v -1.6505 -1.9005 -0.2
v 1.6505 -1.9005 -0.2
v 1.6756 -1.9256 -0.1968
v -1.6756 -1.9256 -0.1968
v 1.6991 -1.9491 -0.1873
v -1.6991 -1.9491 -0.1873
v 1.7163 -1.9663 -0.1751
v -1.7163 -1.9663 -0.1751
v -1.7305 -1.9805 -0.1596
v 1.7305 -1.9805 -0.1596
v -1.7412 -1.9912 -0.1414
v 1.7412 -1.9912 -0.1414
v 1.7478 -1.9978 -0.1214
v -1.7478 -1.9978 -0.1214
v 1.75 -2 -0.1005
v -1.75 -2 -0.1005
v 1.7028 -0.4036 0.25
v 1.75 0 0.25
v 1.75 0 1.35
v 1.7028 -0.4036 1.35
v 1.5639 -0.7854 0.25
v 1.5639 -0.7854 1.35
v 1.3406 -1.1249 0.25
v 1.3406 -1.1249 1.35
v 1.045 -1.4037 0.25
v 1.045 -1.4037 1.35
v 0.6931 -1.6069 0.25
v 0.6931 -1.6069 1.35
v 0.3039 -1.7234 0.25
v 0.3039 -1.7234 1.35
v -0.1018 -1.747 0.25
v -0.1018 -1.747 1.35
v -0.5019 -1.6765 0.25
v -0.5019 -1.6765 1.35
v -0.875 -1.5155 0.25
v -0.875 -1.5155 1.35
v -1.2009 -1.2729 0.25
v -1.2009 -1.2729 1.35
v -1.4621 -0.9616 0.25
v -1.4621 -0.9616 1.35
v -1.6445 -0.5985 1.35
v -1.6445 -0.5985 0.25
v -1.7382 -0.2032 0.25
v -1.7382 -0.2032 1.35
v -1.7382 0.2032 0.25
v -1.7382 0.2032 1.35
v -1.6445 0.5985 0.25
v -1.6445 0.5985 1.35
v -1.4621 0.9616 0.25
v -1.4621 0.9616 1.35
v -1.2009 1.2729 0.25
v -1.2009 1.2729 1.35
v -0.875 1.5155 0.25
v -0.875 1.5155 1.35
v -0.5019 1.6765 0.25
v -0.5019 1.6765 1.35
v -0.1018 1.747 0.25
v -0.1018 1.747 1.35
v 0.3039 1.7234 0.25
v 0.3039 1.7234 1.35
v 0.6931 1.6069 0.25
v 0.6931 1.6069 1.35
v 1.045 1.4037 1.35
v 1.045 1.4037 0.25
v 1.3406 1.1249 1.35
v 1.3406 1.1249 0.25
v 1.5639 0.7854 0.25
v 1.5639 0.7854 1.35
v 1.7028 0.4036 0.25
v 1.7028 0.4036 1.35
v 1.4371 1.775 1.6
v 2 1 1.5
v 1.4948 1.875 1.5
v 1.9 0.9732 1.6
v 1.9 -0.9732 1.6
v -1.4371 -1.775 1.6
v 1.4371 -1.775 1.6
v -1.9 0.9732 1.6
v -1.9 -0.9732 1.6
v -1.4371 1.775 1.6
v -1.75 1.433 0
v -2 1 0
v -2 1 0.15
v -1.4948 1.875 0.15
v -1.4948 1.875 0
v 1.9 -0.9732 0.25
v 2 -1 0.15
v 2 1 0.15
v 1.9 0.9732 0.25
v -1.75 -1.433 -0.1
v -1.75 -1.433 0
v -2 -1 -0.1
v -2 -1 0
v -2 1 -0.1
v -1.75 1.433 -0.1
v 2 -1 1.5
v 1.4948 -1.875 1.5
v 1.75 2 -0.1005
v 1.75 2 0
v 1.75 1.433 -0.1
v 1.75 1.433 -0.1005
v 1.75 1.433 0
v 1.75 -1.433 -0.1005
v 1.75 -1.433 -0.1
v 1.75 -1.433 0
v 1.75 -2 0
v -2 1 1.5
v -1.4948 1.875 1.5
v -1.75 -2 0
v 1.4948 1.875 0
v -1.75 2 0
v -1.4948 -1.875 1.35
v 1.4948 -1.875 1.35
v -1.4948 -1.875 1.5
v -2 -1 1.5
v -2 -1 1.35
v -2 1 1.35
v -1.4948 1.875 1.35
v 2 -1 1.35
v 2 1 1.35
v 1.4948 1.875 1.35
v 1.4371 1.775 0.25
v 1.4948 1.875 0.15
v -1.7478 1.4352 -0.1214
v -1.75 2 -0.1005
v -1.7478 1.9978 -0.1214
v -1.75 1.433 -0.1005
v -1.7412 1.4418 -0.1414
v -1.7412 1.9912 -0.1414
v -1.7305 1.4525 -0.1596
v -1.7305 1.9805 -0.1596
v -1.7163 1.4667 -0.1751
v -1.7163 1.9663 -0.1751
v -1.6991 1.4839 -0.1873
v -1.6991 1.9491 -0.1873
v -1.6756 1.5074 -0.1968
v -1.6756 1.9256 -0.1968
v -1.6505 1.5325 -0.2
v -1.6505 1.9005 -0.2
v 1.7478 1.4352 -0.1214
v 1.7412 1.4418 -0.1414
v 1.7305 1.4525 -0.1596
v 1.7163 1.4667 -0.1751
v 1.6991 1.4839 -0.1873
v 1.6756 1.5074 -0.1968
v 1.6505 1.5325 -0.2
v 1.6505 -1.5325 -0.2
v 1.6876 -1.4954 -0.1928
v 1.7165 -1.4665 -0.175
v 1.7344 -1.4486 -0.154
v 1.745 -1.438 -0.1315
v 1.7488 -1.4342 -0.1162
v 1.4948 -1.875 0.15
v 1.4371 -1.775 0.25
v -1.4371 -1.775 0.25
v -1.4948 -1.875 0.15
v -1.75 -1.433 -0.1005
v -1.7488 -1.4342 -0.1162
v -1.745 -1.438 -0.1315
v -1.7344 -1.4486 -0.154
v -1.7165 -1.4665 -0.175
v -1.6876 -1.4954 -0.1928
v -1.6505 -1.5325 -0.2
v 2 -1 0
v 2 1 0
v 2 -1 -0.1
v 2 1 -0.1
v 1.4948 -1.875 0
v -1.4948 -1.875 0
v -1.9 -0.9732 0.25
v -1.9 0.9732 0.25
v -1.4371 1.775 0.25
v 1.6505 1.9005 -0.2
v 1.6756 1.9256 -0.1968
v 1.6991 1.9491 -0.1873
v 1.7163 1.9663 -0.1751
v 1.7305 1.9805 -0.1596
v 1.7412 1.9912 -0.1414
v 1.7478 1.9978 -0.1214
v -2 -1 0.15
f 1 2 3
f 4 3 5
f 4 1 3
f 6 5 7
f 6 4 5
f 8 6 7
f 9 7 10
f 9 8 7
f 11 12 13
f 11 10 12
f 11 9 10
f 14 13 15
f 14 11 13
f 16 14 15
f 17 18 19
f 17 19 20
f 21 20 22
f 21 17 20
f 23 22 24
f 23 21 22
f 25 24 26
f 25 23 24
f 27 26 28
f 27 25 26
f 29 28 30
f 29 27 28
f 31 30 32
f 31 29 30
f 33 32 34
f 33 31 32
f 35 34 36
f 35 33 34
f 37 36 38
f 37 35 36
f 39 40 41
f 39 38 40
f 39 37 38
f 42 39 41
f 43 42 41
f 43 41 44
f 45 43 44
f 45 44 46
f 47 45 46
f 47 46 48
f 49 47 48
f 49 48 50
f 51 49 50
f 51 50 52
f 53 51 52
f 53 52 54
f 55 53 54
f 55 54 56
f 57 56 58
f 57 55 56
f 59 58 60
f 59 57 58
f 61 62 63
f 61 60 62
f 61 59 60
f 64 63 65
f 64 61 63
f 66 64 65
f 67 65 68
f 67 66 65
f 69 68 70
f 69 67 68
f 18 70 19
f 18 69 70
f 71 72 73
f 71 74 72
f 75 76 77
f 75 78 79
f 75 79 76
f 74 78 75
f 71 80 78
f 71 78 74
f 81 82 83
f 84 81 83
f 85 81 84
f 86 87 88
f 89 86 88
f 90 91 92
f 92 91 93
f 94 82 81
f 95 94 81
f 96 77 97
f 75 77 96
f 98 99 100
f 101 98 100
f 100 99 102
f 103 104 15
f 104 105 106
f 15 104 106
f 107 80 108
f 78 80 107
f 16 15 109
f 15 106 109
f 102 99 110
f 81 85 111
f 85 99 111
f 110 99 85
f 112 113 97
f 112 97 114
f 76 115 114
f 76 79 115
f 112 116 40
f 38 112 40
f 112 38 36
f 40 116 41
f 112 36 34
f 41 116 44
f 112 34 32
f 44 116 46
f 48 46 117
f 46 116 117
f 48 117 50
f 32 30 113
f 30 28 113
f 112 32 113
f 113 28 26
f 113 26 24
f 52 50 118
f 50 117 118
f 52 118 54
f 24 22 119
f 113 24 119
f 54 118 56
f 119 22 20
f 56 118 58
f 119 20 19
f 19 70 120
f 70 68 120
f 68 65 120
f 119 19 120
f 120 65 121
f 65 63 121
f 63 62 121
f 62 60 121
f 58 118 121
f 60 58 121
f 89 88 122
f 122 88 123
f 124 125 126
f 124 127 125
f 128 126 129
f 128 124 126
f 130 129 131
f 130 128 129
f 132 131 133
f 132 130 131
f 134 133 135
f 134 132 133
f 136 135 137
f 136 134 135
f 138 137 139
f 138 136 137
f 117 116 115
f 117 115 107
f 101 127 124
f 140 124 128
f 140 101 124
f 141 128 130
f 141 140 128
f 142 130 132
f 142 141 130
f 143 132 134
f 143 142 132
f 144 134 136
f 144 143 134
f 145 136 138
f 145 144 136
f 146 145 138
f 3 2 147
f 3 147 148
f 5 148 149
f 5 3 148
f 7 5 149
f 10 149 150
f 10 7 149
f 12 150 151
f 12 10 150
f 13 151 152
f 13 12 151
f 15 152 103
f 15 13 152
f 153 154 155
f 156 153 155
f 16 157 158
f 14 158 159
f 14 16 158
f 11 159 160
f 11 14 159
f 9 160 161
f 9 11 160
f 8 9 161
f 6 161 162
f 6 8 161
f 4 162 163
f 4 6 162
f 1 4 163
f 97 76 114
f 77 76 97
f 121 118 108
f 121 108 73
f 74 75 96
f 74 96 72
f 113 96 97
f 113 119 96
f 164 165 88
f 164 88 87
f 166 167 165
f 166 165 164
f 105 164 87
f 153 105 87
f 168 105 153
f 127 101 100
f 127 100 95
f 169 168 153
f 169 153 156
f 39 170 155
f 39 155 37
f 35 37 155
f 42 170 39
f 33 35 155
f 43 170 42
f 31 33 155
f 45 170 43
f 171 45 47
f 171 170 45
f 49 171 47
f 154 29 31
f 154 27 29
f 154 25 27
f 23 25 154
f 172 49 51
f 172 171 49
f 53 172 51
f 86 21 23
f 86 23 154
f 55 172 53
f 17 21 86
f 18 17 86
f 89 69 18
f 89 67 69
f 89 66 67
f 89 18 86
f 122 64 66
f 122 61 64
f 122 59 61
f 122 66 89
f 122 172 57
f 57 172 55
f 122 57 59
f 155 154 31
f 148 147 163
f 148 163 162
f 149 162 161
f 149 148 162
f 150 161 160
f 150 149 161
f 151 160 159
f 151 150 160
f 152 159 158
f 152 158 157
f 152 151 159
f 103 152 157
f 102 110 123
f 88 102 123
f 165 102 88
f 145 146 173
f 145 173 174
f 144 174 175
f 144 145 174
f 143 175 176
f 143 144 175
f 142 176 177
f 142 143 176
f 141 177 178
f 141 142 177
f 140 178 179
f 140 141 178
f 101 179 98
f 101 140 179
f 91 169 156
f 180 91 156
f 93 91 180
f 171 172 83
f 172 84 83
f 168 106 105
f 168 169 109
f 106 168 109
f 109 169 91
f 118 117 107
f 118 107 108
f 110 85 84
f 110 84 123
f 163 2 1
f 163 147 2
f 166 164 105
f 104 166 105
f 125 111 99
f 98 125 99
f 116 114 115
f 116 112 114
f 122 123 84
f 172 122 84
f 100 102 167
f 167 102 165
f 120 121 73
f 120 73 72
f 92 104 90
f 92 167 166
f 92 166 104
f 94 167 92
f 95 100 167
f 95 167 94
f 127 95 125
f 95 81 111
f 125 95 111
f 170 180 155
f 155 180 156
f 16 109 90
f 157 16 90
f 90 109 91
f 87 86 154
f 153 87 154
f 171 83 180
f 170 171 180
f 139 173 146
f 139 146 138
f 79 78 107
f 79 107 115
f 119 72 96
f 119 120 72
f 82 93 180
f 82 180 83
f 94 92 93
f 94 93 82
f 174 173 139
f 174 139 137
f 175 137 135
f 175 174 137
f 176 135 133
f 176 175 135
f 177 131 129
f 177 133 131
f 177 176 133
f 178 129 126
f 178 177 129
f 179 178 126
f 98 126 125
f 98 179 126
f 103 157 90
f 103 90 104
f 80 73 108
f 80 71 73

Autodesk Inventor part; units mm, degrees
ref_plane "YZ Plane" through (0, 0, 0) normal (1, 0, 0) x (0, 1, 0)
ref_plane "XZ Plane" through (0, 0, 0) normal (0, 1, 0) x (-1, 0, 0)
ref_plane "XY Plane" through (0, 0, 0) normal (0, 0, 1) x (1, 0, 0)
sketch "Sketch1" plane through (0, 0, 0) normal (0, 0, 1) x (1, 0, 0)
  line L0 (1.75, -2) -> (-1.75, -2)
  line L1 (-1.75, -2) -> (-1.75, 2)
  line L2 (-1.75, 2) -> (1.75, 2)
  line L3 (1.75, 2) -> (1.75, -2)
  line L4 (1.75, -2) -> (-1.75, 2) construction
  line L5 (-1.75, -2) -> (1.75, 2) construction
  line L6 (-2, -1) -> (-2, 1)
  line L7 (-2, 1) -> (-1.4948, 1.875)
  line L8 (-1.4948, 1.875) -> (1.4948, 1.875)
  line L9 (1.4948, 1.875) -> (2, 1)
  line L10 (2, 1) -> (2, -1)
  line L11 (2, -1) -> (1.4948, -1.875)
  line L12 (1.4948, -1.875) -> (-1.4948, -1.875)
  line L13 (-1.4948, -1.875) -> (-2, -1)
  line L14 (-2, -1) -> (2, 1) construction
  line L15 (-2, 1) -> (2, -1) construction
  point P0 (0, 0)
  point P1 (0, 0)
  dimension "d0" = 3.5
  dimension "d1" = 4
  dimension "d2" = 4
  dimension "d3" = 3.75
  dimension "d6" = 150
  dimension "d7" = 150
  dimension "d8" = 2
extrude "Extrusion1" add sketch "Sketch1" along normal blind 1.6 contours L11 L12 L13 L1 L7 L8 L9 L3 | L3 L9 L10 L11 | L13 L6 L7 L1
sketch "Sketch2" plane through (0, 0, 0) normal (0, 0, -1) x (-1, 0, 0)
  line L0 (2, -1) -> (2, 1) projected
  line L1 (2, 1) -> (1.4948, 1.875) projected
  line L2 (1.4948, 1.875) -> (-1.4948, 1.875) projected
  line L3 (-1.4948, 1.875) -> (-2, 1) projected
  line L4 (-2, 1) -> (-2, -1) projected
  line L5 (-2, -1) -> (-1.4948, -1.875) projected
  line L6 (-1.4948, -1.875) -> (1.4948, -1.875) projected
  line L7 (1.4948, -1.875) -> (2, -1) projected
  line L8 (-1.75, -2) -> (1.75, -2)
  line L9 (1.75, -2) -> (1.75, 2)
  line L10 (1.75, 2) -> (-1.75, 2)
  line L11 (-1.75, 2) -> (-1.75, -2)
  line L12 (-1.75, -2) -> (1.75, 2) construction
  line L13 (1.75, -2) -> (-1.75, 2) construction
  point P0 (0, 0)
  dimension "d11" = 3.5
  dimension "d12" = 4
extrude "Extrusion2" add sketch "Sketch2" along normal blind 0.2 contours L9 L8 L11 L5 L6 L7 | L7 L6 L5 L11 L3 L2 L1 L9 | L1 L2 L3 L11 L10 L9
sketch "Sketch3" plane through (0, 0, 0) normal (0, 0, -1) x (-1, 0, 0)
  line L0 (-1.75, -1.433) -> (-1.75, 1.433) projected
  line L1 (-1.75, 1.433) -> (-2, 1) projected
  line L2 (-2, 1) -> (-2, -1) projected
  line L3 (-2, -1) -> (-1.75, -1.433) projected
  line L4 (1.75, 1.433) -> (1.75, -1.433) projected
  line L5 (1.75, -1.433) -> (2, -1) projected
  line L6 (2, -1) -> (2, 1) projected
  line L7 (2, 1) -> (1.75, 1.433) projected
  point P0 (0, 0)
extrude "Extrusion3" add sketch "Sketch3" along normal up to surface (0.2 mm away)
sketch "Sketch4" plane through (0, 0, 0) normal (0, 1, 0) x (-1, 0, 0)
  line L0 (-2, 1.6) -> (-2, -0.2) projected
  line L1 (-1.4948, 1.6) -> (-2, 1.6) projected
  line L2 (-1.4948, 0) -> (-1.4948, 1.6) projected
  line L3 (-1.75, 0) -> (-1.4948, 0) projected
  line L4 (-1.75, -0.2) -> (-1.75, 0) projected
  line L5 (-1.75, -0.2) -> (-2, -0.2) projected
  line L6 (1.4948, 0) -> (1.75, 0) projected
  line L7 (1.4948, 0) -> (1.4948, 1.6) projected
  line L8 (2, 1.6) -> (1.4948, 1.6) projected
  line L9 (2, -0.2) -> (2, 1.6) projected
  line L10 (2, -0.2) -> (1.75, -0.2) projected
  line L11 (1.75, 0) -> (1.75, -0.2) projected
  line L12 (-3.75, 1.35) -> (-1.75, 1.35)
  line L13 (-1.75, 1.35) -> (-1.75, 0.25)
  line L14 (-1.75, 0.25) -> (-3.75, 0.25)
  line L15 (-3.75, 0.25) -> (-3.75, 1.35)
  line L16 (-1.75, -0.2) -> (1.75, -0.2) projected
  line L17 (0, -0.56) -> (0, 1.96) projected
  point P0 (0, 0)
  dimension "d18" = 0.25
  dimension "d19" = 0.25
  dimension "d21" = 2
  dimension "d22" = 0.25
revolve "Revolution1" cut sketch "Sketch4" angle 360 about axis through (0, 0, -10) along (0, 0, 1) contours L12 L13 L14 L0 | L0 L14 L15 L12
sketch "Sketch5" plane through (0, 0, -0.2) normal (0, 0, -1) x (-1, 0, 0)
  line L0 (-1.75, -2) -> (1.75, -2) projected
  line L1 (1.75, -2) -> (1.75, -1.433) projected
  line L2 (2, -1) -> (1.75, -1.433) projected
  line L3 (2, 1) -> (2, -1) projected
  line L4 (1.75, 1.433) -> (2, 1) projected
  line L5 (1.75, 1.433) -> (1.75, 2) projected
  line L6 (1.75, 2) -> (-1.75, 2) projected
  line L7 (-1.75, 2) -> (-1.75, 1.433) projected
  line L8 (-2, 1) -> (-1.75, 1.433) projected
  line L9 (-2, -1) -> (-2, 1) projected
  line L10 (-1.75, -1.433) -> (-2, -1) projected
  line L11 (-1.75, -1.433) -> (-1.75, -2) projected
  line L12 (2, -1.433) -> (-2, -1.433)
  line L13 (-2, -1.433) -> (-2, 1.433)
  line L14 (-2, 1.433) -> (2, 1.433)
  line L15 (2, 1.433) -> (2, -1.433)
  line L16 (2, -1.433) -> (-2, 1.433) construction
  line L17 (-2, -1.433) -> (2, 1.433) construction
  point P0 (0, 0)
extrude "Extrusion4" cut sketch "Sketch5" against normal blind 0.1 contours L12 L13 L10 | L10 L9 L8 L14 L4 L3 L2 L12 | L2 L15 L12 | L13 L14 L8 | L4 L14 L15
chamfer "Chamfer1" distance 0.1 angle 45 16 edges at (0, -1.875, 1.6) (1.7474, -1.4375, 1.6) (2, 0, 1.6) (1.7474, 1.4375, 1.6) (0, 1.875, 1.6) (-1.7474, 1.4375, 1.6) (-2, 0, 1.6) (-1.7474, -1.4375, 1.6) (0, -1.875, 0.25) (1.7474, -1.4375, 0.25) (2, 0, 0.25) (1.7474, 1.4375, 0.25) (0, 1.875, 0.25) (-1.7474, 1.4375, 0.25) (-2, 0, 0.25) (-1.7474, -1.4375, 0.25)
fillet "Fillet1" radius 0.1 8 edges at (0, 1.433, -0.2) (0, -1.433, -0.2) (-1.75, -1.7165, -0.2) (1.75, -1.7165, -0.2) (0, -2, -0.2) (1.75, 1.7165, -0.2) (0, 2, -0.2) (-1.75, 1.7165, -0.2)
properties part number "SRN4018" material "ABS Plastic"
